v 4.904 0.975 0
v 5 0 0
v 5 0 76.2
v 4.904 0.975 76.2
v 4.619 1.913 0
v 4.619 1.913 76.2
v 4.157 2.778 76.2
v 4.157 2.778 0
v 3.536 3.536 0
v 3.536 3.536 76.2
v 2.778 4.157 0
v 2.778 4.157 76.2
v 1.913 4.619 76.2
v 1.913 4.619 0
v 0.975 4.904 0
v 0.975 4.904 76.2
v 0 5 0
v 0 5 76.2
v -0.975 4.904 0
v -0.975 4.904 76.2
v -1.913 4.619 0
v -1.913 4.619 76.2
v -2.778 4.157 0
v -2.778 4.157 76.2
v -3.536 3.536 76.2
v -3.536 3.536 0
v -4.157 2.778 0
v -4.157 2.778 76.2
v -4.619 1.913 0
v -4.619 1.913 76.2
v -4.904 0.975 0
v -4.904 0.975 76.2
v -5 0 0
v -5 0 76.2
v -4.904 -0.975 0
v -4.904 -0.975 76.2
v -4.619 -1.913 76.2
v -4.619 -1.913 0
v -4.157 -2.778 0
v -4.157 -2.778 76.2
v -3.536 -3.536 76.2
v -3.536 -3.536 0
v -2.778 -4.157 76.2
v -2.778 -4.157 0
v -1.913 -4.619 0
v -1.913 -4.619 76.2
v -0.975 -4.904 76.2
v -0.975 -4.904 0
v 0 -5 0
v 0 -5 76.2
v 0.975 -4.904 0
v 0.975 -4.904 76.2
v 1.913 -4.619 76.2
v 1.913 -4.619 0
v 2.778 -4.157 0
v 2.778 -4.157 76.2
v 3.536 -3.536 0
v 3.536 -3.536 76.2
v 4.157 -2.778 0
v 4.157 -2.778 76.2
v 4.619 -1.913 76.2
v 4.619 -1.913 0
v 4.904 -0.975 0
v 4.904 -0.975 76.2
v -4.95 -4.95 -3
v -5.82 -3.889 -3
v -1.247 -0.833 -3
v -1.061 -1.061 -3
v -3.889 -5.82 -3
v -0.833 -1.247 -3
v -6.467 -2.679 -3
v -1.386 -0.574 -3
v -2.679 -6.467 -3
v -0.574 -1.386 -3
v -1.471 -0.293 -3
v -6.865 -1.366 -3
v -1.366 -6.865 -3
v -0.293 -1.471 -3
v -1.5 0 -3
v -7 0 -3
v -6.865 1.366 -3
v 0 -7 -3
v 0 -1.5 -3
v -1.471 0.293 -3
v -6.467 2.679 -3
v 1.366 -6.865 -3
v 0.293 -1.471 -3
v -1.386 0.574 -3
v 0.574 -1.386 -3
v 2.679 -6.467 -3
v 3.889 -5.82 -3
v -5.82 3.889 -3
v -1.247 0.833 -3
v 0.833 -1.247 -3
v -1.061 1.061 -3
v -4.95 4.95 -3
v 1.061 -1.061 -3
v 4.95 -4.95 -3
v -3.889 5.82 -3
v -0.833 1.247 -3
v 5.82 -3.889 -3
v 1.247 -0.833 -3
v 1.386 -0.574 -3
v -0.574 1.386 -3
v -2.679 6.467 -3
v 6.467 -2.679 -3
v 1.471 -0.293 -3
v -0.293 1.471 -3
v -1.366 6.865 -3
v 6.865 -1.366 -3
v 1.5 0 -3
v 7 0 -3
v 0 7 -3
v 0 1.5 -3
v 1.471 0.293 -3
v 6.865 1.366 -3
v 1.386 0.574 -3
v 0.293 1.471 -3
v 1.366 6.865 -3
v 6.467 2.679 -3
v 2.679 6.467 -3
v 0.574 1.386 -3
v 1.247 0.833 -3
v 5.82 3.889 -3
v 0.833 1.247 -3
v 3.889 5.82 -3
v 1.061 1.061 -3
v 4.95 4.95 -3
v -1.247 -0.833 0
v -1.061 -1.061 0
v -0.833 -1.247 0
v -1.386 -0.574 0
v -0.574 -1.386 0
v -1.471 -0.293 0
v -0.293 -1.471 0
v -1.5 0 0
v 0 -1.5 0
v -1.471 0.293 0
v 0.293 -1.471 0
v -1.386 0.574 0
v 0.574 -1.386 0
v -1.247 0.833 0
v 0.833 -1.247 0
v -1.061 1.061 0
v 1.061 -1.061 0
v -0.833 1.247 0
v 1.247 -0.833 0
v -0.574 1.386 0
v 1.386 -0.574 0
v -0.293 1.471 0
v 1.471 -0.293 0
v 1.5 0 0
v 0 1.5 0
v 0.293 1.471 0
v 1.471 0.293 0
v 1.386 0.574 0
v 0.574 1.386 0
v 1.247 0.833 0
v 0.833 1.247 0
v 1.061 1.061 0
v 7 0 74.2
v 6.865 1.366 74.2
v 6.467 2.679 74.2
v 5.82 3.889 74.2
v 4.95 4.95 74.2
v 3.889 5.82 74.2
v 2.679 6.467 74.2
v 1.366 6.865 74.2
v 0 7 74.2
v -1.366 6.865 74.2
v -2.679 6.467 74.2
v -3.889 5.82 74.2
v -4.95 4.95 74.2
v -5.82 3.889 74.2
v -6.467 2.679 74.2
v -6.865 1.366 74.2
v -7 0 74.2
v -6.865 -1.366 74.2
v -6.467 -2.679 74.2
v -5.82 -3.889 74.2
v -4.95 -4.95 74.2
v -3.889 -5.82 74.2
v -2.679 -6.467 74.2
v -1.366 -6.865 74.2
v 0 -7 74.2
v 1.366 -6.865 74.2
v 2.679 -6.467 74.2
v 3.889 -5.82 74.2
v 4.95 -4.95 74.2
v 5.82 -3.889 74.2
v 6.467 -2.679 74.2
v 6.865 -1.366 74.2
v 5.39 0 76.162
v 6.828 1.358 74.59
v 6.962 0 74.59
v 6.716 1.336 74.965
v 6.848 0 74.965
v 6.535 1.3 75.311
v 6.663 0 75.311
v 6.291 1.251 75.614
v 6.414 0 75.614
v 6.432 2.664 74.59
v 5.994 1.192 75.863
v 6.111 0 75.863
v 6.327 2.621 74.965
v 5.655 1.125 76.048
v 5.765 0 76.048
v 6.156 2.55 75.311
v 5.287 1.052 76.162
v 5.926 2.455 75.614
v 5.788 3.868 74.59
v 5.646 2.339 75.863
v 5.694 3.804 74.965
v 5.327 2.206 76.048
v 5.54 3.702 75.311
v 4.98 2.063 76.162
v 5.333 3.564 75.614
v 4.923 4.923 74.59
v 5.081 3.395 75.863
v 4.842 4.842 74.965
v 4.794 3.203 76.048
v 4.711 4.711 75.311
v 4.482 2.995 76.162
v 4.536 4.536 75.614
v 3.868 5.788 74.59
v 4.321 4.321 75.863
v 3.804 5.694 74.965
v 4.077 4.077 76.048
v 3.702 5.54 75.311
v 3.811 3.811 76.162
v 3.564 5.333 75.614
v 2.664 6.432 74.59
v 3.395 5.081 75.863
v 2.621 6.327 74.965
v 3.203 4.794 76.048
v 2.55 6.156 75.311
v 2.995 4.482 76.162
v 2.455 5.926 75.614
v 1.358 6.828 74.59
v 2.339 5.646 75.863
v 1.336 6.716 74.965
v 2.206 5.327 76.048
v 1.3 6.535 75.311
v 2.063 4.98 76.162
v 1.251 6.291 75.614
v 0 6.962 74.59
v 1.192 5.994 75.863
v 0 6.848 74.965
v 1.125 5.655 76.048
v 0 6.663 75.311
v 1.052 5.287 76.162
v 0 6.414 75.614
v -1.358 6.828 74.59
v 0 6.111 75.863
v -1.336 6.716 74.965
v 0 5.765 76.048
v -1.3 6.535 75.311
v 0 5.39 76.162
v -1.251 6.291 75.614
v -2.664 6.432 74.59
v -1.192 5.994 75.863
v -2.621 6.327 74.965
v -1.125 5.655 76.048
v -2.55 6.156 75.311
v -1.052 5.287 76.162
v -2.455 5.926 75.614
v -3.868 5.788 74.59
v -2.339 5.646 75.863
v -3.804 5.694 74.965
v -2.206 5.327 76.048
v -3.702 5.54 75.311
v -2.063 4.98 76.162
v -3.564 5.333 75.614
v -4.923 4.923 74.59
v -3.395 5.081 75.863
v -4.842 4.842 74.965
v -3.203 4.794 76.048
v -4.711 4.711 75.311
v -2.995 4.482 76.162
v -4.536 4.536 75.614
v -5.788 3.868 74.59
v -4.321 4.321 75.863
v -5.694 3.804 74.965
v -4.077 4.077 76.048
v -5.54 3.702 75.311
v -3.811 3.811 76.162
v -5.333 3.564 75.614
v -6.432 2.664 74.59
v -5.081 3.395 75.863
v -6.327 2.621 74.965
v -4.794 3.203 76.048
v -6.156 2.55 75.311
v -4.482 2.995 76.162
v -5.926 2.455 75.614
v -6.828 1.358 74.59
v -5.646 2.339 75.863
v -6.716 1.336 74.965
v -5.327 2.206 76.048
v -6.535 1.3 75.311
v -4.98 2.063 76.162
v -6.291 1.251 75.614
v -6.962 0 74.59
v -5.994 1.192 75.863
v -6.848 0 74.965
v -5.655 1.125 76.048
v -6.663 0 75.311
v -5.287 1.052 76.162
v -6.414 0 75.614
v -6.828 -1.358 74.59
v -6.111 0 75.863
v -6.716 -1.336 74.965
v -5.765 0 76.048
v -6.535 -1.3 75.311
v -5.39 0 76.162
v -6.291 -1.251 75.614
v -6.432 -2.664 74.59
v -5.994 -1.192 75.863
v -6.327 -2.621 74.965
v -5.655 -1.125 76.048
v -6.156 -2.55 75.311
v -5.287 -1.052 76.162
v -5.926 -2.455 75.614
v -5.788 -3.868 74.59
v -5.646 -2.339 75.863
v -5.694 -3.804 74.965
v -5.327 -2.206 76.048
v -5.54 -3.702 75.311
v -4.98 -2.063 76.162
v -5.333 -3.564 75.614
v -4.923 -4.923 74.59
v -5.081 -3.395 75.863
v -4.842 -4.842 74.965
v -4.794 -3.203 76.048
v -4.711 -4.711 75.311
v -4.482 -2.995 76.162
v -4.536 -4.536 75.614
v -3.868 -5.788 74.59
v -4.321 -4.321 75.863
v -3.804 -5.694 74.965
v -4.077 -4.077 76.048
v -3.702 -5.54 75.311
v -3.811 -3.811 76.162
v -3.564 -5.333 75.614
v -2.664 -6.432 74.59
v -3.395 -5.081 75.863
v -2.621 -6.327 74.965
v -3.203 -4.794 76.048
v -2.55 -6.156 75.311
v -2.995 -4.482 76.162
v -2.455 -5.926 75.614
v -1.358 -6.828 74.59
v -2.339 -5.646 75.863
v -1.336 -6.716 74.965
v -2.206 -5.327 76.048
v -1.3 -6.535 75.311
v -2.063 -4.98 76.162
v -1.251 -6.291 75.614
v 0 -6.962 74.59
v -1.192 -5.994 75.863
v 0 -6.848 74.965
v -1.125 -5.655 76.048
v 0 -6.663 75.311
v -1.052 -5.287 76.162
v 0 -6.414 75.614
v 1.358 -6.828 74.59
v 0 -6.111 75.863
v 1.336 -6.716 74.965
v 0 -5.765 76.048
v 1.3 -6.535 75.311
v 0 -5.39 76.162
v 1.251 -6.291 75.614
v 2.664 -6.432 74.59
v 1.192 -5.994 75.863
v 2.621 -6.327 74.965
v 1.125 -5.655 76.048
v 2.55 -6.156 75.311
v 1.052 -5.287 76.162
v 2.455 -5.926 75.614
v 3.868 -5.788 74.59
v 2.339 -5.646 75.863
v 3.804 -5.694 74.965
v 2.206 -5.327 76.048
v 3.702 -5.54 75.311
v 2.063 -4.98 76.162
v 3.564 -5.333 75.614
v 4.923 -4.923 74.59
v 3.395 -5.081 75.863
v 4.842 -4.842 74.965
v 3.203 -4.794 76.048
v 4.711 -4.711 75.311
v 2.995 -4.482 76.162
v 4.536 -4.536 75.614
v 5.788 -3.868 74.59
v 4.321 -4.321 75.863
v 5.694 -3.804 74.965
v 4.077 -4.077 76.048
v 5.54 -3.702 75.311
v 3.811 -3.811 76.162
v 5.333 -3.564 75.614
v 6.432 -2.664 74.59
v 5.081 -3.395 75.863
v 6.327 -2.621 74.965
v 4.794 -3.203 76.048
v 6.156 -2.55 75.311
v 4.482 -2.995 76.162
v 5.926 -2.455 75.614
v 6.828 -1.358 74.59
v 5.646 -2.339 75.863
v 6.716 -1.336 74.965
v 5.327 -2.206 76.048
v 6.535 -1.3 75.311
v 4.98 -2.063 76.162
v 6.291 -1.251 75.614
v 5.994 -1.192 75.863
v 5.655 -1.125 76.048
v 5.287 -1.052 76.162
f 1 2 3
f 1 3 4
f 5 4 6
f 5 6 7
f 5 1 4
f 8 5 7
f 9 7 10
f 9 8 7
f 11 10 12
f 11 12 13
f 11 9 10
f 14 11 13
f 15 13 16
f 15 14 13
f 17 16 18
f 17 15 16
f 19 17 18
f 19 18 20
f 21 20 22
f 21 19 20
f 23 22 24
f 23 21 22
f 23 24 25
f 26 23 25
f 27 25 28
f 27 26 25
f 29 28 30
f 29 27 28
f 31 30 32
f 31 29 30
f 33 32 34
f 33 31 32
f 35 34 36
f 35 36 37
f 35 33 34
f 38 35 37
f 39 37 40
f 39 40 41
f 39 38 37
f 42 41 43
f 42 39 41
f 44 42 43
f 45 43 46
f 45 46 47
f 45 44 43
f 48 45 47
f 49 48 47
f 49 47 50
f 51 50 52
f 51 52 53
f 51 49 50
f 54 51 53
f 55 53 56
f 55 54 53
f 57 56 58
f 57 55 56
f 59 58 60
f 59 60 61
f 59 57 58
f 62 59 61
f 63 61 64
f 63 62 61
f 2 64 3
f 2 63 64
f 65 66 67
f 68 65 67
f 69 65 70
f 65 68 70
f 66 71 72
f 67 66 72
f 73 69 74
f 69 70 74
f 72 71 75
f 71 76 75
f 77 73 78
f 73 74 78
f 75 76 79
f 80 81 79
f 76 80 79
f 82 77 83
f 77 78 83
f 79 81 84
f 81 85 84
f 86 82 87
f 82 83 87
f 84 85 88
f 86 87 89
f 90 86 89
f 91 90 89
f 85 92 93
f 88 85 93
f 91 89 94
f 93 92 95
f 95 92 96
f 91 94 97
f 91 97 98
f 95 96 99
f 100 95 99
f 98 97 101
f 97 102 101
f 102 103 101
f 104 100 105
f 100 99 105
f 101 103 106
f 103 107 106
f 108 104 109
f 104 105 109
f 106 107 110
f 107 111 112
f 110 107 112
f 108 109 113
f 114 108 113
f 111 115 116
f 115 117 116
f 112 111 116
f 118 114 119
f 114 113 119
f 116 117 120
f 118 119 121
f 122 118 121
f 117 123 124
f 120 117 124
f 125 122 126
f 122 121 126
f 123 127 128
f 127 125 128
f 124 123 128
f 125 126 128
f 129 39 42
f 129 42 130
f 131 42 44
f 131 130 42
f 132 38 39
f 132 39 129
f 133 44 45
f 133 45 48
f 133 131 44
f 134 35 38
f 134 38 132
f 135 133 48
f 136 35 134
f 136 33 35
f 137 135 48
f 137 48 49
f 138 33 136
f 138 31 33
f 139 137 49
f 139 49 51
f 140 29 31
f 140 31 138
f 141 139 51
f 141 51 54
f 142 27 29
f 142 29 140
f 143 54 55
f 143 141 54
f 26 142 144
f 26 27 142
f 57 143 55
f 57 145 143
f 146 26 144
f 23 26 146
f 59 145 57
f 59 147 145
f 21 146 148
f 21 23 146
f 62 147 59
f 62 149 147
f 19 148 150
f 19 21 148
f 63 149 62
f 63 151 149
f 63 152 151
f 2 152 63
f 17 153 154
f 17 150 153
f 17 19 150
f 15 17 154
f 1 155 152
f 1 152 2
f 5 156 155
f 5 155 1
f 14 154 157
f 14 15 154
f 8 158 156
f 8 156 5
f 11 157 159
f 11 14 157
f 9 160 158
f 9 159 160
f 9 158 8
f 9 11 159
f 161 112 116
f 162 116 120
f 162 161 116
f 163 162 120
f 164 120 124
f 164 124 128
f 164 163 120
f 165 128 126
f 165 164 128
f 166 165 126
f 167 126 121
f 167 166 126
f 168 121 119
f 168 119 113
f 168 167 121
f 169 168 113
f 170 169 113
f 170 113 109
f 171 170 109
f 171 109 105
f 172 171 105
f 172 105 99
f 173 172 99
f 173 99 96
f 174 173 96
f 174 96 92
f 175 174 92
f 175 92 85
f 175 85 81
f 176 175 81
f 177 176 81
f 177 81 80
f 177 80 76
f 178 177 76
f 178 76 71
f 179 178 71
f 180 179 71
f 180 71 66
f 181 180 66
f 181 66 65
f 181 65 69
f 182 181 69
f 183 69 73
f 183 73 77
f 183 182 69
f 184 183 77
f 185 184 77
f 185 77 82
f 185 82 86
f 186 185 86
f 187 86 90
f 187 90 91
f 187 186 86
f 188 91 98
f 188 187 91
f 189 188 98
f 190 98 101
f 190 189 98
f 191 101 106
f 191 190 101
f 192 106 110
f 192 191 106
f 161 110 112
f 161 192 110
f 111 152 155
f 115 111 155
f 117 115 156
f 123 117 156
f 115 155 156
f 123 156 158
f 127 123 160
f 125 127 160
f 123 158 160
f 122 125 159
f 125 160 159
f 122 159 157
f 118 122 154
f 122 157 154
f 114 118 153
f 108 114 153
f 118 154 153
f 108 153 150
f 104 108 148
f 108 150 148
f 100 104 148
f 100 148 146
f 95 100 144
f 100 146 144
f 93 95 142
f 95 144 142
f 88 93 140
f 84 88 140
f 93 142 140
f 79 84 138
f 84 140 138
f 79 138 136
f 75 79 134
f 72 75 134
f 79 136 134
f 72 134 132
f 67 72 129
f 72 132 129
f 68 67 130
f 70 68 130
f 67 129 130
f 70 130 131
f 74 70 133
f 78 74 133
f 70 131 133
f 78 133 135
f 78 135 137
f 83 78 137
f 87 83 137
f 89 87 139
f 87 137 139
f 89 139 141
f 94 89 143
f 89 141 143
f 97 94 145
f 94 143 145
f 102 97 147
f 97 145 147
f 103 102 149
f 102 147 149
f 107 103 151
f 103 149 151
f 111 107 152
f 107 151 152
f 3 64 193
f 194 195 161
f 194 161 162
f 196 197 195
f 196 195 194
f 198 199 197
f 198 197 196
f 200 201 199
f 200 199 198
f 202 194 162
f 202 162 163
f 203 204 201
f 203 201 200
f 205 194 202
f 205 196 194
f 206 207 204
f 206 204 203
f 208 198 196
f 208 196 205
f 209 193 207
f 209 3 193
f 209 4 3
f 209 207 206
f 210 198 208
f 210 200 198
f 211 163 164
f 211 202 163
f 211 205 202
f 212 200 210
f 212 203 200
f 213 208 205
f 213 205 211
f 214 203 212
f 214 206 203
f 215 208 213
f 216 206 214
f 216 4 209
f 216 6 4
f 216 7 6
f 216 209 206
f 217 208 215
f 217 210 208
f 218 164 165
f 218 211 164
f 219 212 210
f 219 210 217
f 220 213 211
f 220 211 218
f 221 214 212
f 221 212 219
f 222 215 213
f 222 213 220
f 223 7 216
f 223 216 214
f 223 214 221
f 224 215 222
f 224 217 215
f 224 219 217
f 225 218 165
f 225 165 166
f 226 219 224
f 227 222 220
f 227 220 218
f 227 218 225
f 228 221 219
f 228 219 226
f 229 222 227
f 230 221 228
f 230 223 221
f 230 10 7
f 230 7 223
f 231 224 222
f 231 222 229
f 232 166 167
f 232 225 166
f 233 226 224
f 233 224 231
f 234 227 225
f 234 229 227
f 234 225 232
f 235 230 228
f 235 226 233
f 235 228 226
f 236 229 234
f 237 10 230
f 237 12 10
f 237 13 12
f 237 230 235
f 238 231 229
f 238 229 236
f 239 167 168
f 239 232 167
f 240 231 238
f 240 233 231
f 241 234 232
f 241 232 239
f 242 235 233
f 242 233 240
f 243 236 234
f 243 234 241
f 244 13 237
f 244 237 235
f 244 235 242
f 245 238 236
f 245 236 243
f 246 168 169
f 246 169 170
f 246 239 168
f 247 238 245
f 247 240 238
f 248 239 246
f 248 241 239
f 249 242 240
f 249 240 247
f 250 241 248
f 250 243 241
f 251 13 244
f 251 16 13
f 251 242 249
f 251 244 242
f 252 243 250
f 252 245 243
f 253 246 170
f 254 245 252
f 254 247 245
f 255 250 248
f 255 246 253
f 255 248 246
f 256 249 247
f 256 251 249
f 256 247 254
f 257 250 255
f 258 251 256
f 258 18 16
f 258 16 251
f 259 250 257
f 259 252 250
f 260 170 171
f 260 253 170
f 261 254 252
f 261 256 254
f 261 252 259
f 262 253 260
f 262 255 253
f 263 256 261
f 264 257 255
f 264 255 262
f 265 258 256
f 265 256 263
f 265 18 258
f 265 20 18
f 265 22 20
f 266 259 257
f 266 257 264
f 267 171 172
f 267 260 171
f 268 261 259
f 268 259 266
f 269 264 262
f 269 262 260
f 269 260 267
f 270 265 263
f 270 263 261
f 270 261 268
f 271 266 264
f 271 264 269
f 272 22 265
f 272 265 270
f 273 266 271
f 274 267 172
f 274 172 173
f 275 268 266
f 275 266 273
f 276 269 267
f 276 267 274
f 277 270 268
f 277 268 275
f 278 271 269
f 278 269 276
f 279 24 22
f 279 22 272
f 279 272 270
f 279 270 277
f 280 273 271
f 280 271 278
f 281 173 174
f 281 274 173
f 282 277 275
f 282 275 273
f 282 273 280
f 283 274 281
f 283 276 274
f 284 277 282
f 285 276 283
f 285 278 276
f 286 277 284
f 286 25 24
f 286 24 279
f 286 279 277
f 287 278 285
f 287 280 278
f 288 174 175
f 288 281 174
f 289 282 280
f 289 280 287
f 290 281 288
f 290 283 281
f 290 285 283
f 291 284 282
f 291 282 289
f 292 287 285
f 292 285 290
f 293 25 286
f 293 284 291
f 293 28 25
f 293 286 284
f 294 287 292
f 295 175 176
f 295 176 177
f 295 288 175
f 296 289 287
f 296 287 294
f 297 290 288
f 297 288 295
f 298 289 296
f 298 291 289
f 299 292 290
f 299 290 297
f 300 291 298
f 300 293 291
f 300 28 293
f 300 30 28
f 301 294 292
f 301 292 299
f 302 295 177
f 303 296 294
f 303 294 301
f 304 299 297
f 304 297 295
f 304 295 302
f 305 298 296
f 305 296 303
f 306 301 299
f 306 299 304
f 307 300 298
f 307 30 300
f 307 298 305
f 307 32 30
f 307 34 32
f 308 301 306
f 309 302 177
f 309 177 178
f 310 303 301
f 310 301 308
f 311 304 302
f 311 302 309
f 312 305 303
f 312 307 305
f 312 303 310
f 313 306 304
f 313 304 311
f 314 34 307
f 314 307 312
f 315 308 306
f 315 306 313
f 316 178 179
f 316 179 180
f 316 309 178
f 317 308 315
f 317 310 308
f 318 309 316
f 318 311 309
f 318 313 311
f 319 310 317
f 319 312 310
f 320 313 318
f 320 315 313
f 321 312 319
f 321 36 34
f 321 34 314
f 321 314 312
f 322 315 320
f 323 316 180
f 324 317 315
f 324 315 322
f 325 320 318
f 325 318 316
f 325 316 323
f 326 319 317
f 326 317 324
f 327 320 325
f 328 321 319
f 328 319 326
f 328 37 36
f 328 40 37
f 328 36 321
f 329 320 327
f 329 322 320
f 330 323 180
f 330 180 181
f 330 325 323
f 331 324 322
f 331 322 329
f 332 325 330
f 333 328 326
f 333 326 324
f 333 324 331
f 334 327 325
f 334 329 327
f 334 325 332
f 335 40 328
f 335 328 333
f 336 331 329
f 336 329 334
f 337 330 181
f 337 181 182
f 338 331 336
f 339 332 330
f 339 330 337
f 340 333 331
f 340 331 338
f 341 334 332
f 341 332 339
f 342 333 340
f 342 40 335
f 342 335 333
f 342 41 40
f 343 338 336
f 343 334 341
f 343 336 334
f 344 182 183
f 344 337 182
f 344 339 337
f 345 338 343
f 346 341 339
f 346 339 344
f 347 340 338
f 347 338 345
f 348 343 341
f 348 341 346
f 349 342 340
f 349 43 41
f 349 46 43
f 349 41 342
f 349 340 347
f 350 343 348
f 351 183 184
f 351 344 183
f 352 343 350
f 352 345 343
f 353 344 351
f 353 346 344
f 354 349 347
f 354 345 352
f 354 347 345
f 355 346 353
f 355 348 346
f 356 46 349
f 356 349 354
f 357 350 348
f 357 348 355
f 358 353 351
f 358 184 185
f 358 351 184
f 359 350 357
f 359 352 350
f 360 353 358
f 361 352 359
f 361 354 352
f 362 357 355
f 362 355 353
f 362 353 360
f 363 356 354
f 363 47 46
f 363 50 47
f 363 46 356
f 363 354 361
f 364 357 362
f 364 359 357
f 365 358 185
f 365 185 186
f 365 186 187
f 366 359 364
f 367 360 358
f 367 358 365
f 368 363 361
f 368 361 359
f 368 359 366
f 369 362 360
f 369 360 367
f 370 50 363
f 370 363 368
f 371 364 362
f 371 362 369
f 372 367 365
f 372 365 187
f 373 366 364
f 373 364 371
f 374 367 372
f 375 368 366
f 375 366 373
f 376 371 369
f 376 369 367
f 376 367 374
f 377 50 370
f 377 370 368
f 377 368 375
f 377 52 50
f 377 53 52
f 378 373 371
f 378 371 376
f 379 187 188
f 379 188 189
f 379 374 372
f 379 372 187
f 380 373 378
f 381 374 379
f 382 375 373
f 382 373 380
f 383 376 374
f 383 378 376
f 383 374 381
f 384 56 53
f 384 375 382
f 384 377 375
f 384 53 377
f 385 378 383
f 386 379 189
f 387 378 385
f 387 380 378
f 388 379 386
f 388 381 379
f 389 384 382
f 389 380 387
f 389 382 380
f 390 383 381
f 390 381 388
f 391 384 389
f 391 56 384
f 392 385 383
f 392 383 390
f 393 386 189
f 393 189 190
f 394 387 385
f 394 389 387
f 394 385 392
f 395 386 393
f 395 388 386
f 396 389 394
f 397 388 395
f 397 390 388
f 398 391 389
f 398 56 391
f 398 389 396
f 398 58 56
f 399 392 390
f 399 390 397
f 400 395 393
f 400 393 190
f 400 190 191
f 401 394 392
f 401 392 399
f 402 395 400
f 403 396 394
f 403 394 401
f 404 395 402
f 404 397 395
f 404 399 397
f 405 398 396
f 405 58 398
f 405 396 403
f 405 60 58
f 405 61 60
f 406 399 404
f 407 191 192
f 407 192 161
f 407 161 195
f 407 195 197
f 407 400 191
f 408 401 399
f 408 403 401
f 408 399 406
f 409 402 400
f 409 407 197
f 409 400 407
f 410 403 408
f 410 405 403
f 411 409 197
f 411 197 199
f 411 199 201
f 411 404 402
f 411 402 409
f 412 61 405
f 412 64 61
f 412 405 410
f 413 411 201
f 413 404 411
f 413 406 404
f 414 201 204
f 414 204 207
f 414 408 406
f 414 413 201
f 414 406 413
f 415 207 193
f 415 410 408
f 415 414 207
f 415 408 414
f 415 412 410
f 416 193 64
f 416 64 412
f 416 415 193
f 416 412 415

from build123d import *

# Parameters (mm, degrees)
F0_R     = 7
F0_R_2   = 5
F1_DEPTH = 76.2
F0_R_3   = 1.5
F2_DEPTH = 3
F3_R     = 1.99999


# Not quite as in the source:
# - a fillet or chamfer is up to 0.001 mm smaller than in the source, because OpenCascade refuses the exact size


with BuildPart() as f1:
    # F0 (on Top) → F1 (new body)
    with BuildSketch(Plane.XY):
        Circle(F0_R)
        Circle(F0_R_2, mode=Mode.SUBTRACT)
    extrude(amount=F1_DEPTH)

    # F0 (on Top) → F2 (join)
    with BuildSketch(Plane.XY):
        Circle(F0_R)
        Circle(F0_R_2, mode=Mode.SUBTRACT)
        Circle(F0_R_2)
        Circle(F0_R_3, mode=Mode.SUBTRACT)
    extrude(amount=-F2_DEPTH)

    # F3 (radius 2 in the source; OpenCascade refuses exactly that, so slightly less here)
    f3_edges = [f1.edges().sort_by_distance(p)[0] for p in [
        (-7, 0, 76.2),
    ]]
    fillet(f3_edges, radius=F3_R)


solid = f1.part
